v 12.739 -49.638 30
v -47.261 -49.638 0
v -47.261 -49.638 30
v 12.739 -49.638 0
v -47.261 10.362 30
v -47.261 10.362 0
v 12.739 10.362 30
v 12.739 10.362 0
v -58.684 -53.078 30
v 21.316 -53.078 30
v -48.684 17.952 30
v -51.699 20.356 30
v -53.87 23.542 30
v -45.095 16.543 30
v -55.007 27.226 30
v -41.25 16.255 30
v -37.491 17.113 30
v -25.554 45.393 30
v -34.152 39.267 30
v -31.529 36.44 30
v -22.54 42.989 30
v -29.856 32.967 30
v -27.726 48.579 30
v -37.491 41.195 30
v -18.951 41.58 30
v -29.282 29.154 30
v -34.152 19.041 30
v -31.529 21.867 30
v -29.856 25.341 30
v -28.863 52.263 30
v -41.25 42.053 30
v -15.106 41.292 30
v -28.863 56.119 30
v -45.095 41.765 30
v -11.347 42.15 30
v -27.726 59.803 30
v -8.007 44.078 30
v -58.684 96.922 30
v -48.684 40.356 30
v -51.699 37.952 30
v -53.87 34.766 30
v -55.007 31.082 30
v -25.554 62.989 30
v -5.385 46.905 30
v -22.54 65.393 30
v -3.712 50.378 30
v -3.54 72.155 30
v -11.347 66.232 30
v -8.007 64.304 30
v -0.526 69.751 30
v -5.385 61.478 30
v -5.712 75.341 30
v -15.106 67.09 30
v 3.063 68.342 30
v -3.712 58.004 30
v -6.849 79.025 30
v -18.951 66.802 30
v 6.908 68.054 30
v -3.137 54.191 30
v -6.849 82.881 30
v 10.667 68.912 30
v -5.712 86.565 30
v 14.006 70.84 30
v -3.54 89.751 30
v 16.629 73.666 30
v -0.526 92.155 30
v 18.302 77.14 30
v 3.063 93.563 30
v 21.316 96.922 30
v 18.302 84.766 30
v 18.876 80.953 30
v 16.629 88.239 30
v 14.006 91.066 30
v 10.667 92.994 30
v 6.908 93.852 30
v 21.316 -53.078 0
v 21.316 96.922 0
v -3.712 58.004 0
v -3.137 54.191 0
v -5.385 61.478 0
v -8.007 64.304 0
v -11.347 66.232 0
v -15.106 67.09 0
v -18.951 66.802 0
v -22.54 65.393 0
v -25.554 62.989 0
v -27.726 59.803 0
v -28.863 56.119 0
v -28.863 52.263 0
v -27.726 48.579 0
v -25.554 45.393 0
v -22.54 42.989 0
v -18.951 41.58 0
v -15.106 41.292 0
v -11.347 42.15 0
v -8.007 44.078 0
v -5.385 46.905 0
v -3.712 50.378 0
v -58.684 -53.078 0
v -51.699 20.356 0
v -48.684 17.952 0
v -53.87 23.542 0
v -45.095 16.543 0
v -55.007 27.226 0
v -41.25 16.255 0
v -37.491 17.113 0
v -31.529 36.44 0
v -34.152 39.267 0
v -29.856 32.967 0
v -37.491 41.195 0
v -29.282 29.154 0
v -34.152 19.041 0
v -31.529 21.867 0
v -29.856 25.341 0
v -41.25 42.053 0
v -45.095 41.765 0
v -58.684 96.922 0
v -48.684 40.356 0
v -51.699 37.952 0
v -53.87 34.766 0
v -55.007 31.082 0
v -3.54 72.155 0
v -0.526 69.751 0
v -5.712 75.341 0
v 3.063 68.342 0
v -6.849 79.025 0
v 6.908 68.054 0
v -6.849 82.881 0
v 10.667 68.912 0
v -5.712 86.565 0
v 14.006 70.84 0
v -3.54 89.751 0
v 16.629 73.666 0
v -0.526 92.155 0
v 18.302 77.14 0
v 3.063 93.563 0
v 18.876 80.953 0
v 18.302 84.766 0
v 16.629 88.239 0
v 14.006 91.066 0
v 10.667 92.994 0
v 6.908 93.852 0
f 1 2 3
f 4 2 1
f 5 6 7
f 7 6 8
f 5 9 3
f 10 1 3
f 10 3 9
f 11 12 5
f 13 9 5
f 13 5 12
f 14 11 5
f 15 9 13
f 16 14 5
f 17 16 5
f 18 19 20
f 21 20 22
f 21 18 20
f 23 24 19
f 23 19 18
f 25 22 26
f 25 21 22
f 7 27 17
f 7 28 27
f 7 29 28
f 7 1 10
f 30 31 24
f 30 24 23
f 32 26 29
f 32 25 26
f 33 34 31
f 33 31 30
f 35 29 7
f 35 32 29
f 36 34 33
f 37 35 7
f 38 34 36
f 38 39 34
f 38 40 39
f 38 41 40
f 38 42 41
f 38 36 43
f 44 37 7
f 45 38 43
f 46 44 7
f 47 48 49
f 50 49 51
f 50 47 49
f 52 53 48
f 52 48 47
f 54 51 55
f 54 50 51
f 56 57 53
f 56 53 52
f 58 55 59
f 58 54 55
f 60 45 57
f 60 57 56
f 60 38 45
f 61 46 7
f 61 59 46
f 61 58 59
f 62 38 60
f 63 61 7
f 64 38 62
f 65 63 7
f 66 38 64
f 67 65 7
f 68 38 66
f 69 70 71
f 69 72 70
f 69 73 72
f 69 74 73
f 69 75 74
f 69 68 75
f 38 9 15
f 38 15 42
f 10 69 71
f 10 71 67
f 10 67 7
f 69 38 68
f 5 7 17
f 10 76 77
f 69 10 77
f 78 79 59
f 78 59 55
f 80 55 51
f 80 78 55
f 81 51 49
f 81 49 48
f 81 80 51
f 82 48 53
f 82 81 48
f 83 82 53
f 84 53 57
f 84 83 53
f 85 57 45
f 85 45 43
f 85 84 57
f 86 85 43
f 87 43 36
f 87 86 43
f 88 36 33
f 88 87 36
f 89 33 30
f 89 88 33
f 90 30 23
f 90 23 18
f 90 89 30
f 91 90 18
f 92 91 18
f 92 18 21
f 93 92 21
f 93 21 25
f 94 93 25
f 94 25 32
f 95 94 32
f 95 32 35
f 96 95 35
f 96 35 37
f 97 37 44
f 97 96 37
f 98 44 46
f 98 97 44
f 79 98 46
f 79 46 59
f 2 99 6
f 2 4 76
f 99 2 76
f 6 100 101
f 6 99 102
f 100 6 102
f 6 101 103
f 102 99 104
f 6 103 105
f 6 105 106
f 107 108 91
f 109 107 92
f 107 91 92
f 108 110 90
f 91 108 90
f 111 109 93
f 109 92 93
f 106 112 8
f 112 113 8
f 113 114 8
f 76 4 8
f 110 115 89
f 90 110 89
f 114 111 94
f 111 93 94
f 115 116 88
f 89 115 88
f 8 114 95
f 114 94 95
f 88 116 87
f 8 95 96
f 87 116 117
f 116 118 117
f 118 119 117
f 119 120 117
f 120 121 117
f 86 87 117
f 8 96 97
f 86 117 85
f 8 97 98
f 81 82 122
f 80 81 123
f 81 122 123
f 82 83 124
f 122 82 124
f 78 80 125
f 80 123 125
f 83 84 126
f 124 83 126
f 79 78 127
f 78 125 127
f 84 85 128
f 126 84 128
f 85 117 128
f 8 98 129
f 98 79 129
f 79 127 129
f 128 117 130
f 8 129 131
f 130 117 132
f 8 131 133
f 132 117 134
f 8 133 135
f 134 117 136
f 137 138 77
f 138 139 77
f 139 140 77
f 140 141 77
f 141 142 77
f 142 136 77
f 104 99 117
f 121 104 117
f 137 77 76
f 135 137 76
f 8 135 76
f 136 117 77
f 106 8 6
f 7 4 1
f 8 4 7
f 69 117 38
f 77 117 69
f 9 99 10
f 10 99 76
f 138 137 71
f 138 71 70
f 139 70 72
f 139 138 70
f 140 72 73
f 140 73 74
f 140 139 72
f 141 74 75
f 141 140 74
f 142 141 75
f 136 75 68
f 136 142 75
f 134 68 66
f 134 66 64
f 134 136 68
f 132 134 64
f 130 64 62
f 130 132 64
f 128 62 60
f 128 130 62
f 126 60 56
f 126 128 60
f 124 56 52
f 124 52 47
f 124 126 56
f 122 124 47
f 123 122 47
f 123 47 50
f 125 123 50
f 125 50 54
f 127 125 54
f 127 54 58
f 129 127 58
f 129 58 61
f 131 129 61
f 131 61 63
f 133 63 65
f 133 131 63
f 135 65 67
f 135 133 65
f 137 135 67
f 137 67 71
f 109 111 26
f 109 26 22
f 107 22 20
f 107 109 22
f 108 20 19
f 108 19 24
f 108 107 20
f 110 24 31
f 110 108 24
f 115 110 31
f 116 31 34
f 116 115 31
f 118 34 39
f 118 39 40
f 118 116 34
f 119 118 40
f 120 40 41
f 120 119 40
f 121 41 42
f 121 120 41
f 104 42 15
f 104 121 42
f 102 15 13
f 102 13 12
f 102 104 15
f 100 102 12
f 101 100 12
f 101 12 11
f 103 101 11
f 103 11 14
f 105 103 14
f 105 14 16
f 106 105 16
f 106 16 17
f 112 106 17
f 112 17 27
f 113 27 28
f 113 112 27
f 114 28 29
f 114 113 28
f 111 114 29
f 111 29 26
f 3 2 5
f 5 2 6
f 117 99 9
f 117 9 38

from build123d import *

# Parameters (mm, degrees)
SKETCH_W   = 80
SKETCH_H   = 150
SKETCH_R   = 12.93489
SKETCH_W_2 = 60
SKETCH_H_2 = 60
PAD_DEPTH  = 30


with BuildPart() as part:
    # Sketch → Pad (new body)
    with BuildSketch(Plane.XY):
        with Locations((-18.684139, 21.9223)):
            Rectangle(SKETCH_W, SKETCH_H)
        with Locations((-42.216557, 29.153965)):
            Circle(SKETCH_R, mode=Mode.SUBTRACT)
        with Locations((-16.072264, 54.191032)):
            Circle(SKETCH_R, mode=Mode.SUBTRACT)
        with Locations((5.941536, 80.952904)):
            Circle(SKETCH_R, mode=Mode.SUBTRACT)
        with Locations((-17.261113, -19.638437)):
            Rectangle(SKETCH_W_2, SKETCH_H_2, mode=Mode.SUBTRACT)
    extrude(amount=PAD_DEPTH)


solid = part.part
